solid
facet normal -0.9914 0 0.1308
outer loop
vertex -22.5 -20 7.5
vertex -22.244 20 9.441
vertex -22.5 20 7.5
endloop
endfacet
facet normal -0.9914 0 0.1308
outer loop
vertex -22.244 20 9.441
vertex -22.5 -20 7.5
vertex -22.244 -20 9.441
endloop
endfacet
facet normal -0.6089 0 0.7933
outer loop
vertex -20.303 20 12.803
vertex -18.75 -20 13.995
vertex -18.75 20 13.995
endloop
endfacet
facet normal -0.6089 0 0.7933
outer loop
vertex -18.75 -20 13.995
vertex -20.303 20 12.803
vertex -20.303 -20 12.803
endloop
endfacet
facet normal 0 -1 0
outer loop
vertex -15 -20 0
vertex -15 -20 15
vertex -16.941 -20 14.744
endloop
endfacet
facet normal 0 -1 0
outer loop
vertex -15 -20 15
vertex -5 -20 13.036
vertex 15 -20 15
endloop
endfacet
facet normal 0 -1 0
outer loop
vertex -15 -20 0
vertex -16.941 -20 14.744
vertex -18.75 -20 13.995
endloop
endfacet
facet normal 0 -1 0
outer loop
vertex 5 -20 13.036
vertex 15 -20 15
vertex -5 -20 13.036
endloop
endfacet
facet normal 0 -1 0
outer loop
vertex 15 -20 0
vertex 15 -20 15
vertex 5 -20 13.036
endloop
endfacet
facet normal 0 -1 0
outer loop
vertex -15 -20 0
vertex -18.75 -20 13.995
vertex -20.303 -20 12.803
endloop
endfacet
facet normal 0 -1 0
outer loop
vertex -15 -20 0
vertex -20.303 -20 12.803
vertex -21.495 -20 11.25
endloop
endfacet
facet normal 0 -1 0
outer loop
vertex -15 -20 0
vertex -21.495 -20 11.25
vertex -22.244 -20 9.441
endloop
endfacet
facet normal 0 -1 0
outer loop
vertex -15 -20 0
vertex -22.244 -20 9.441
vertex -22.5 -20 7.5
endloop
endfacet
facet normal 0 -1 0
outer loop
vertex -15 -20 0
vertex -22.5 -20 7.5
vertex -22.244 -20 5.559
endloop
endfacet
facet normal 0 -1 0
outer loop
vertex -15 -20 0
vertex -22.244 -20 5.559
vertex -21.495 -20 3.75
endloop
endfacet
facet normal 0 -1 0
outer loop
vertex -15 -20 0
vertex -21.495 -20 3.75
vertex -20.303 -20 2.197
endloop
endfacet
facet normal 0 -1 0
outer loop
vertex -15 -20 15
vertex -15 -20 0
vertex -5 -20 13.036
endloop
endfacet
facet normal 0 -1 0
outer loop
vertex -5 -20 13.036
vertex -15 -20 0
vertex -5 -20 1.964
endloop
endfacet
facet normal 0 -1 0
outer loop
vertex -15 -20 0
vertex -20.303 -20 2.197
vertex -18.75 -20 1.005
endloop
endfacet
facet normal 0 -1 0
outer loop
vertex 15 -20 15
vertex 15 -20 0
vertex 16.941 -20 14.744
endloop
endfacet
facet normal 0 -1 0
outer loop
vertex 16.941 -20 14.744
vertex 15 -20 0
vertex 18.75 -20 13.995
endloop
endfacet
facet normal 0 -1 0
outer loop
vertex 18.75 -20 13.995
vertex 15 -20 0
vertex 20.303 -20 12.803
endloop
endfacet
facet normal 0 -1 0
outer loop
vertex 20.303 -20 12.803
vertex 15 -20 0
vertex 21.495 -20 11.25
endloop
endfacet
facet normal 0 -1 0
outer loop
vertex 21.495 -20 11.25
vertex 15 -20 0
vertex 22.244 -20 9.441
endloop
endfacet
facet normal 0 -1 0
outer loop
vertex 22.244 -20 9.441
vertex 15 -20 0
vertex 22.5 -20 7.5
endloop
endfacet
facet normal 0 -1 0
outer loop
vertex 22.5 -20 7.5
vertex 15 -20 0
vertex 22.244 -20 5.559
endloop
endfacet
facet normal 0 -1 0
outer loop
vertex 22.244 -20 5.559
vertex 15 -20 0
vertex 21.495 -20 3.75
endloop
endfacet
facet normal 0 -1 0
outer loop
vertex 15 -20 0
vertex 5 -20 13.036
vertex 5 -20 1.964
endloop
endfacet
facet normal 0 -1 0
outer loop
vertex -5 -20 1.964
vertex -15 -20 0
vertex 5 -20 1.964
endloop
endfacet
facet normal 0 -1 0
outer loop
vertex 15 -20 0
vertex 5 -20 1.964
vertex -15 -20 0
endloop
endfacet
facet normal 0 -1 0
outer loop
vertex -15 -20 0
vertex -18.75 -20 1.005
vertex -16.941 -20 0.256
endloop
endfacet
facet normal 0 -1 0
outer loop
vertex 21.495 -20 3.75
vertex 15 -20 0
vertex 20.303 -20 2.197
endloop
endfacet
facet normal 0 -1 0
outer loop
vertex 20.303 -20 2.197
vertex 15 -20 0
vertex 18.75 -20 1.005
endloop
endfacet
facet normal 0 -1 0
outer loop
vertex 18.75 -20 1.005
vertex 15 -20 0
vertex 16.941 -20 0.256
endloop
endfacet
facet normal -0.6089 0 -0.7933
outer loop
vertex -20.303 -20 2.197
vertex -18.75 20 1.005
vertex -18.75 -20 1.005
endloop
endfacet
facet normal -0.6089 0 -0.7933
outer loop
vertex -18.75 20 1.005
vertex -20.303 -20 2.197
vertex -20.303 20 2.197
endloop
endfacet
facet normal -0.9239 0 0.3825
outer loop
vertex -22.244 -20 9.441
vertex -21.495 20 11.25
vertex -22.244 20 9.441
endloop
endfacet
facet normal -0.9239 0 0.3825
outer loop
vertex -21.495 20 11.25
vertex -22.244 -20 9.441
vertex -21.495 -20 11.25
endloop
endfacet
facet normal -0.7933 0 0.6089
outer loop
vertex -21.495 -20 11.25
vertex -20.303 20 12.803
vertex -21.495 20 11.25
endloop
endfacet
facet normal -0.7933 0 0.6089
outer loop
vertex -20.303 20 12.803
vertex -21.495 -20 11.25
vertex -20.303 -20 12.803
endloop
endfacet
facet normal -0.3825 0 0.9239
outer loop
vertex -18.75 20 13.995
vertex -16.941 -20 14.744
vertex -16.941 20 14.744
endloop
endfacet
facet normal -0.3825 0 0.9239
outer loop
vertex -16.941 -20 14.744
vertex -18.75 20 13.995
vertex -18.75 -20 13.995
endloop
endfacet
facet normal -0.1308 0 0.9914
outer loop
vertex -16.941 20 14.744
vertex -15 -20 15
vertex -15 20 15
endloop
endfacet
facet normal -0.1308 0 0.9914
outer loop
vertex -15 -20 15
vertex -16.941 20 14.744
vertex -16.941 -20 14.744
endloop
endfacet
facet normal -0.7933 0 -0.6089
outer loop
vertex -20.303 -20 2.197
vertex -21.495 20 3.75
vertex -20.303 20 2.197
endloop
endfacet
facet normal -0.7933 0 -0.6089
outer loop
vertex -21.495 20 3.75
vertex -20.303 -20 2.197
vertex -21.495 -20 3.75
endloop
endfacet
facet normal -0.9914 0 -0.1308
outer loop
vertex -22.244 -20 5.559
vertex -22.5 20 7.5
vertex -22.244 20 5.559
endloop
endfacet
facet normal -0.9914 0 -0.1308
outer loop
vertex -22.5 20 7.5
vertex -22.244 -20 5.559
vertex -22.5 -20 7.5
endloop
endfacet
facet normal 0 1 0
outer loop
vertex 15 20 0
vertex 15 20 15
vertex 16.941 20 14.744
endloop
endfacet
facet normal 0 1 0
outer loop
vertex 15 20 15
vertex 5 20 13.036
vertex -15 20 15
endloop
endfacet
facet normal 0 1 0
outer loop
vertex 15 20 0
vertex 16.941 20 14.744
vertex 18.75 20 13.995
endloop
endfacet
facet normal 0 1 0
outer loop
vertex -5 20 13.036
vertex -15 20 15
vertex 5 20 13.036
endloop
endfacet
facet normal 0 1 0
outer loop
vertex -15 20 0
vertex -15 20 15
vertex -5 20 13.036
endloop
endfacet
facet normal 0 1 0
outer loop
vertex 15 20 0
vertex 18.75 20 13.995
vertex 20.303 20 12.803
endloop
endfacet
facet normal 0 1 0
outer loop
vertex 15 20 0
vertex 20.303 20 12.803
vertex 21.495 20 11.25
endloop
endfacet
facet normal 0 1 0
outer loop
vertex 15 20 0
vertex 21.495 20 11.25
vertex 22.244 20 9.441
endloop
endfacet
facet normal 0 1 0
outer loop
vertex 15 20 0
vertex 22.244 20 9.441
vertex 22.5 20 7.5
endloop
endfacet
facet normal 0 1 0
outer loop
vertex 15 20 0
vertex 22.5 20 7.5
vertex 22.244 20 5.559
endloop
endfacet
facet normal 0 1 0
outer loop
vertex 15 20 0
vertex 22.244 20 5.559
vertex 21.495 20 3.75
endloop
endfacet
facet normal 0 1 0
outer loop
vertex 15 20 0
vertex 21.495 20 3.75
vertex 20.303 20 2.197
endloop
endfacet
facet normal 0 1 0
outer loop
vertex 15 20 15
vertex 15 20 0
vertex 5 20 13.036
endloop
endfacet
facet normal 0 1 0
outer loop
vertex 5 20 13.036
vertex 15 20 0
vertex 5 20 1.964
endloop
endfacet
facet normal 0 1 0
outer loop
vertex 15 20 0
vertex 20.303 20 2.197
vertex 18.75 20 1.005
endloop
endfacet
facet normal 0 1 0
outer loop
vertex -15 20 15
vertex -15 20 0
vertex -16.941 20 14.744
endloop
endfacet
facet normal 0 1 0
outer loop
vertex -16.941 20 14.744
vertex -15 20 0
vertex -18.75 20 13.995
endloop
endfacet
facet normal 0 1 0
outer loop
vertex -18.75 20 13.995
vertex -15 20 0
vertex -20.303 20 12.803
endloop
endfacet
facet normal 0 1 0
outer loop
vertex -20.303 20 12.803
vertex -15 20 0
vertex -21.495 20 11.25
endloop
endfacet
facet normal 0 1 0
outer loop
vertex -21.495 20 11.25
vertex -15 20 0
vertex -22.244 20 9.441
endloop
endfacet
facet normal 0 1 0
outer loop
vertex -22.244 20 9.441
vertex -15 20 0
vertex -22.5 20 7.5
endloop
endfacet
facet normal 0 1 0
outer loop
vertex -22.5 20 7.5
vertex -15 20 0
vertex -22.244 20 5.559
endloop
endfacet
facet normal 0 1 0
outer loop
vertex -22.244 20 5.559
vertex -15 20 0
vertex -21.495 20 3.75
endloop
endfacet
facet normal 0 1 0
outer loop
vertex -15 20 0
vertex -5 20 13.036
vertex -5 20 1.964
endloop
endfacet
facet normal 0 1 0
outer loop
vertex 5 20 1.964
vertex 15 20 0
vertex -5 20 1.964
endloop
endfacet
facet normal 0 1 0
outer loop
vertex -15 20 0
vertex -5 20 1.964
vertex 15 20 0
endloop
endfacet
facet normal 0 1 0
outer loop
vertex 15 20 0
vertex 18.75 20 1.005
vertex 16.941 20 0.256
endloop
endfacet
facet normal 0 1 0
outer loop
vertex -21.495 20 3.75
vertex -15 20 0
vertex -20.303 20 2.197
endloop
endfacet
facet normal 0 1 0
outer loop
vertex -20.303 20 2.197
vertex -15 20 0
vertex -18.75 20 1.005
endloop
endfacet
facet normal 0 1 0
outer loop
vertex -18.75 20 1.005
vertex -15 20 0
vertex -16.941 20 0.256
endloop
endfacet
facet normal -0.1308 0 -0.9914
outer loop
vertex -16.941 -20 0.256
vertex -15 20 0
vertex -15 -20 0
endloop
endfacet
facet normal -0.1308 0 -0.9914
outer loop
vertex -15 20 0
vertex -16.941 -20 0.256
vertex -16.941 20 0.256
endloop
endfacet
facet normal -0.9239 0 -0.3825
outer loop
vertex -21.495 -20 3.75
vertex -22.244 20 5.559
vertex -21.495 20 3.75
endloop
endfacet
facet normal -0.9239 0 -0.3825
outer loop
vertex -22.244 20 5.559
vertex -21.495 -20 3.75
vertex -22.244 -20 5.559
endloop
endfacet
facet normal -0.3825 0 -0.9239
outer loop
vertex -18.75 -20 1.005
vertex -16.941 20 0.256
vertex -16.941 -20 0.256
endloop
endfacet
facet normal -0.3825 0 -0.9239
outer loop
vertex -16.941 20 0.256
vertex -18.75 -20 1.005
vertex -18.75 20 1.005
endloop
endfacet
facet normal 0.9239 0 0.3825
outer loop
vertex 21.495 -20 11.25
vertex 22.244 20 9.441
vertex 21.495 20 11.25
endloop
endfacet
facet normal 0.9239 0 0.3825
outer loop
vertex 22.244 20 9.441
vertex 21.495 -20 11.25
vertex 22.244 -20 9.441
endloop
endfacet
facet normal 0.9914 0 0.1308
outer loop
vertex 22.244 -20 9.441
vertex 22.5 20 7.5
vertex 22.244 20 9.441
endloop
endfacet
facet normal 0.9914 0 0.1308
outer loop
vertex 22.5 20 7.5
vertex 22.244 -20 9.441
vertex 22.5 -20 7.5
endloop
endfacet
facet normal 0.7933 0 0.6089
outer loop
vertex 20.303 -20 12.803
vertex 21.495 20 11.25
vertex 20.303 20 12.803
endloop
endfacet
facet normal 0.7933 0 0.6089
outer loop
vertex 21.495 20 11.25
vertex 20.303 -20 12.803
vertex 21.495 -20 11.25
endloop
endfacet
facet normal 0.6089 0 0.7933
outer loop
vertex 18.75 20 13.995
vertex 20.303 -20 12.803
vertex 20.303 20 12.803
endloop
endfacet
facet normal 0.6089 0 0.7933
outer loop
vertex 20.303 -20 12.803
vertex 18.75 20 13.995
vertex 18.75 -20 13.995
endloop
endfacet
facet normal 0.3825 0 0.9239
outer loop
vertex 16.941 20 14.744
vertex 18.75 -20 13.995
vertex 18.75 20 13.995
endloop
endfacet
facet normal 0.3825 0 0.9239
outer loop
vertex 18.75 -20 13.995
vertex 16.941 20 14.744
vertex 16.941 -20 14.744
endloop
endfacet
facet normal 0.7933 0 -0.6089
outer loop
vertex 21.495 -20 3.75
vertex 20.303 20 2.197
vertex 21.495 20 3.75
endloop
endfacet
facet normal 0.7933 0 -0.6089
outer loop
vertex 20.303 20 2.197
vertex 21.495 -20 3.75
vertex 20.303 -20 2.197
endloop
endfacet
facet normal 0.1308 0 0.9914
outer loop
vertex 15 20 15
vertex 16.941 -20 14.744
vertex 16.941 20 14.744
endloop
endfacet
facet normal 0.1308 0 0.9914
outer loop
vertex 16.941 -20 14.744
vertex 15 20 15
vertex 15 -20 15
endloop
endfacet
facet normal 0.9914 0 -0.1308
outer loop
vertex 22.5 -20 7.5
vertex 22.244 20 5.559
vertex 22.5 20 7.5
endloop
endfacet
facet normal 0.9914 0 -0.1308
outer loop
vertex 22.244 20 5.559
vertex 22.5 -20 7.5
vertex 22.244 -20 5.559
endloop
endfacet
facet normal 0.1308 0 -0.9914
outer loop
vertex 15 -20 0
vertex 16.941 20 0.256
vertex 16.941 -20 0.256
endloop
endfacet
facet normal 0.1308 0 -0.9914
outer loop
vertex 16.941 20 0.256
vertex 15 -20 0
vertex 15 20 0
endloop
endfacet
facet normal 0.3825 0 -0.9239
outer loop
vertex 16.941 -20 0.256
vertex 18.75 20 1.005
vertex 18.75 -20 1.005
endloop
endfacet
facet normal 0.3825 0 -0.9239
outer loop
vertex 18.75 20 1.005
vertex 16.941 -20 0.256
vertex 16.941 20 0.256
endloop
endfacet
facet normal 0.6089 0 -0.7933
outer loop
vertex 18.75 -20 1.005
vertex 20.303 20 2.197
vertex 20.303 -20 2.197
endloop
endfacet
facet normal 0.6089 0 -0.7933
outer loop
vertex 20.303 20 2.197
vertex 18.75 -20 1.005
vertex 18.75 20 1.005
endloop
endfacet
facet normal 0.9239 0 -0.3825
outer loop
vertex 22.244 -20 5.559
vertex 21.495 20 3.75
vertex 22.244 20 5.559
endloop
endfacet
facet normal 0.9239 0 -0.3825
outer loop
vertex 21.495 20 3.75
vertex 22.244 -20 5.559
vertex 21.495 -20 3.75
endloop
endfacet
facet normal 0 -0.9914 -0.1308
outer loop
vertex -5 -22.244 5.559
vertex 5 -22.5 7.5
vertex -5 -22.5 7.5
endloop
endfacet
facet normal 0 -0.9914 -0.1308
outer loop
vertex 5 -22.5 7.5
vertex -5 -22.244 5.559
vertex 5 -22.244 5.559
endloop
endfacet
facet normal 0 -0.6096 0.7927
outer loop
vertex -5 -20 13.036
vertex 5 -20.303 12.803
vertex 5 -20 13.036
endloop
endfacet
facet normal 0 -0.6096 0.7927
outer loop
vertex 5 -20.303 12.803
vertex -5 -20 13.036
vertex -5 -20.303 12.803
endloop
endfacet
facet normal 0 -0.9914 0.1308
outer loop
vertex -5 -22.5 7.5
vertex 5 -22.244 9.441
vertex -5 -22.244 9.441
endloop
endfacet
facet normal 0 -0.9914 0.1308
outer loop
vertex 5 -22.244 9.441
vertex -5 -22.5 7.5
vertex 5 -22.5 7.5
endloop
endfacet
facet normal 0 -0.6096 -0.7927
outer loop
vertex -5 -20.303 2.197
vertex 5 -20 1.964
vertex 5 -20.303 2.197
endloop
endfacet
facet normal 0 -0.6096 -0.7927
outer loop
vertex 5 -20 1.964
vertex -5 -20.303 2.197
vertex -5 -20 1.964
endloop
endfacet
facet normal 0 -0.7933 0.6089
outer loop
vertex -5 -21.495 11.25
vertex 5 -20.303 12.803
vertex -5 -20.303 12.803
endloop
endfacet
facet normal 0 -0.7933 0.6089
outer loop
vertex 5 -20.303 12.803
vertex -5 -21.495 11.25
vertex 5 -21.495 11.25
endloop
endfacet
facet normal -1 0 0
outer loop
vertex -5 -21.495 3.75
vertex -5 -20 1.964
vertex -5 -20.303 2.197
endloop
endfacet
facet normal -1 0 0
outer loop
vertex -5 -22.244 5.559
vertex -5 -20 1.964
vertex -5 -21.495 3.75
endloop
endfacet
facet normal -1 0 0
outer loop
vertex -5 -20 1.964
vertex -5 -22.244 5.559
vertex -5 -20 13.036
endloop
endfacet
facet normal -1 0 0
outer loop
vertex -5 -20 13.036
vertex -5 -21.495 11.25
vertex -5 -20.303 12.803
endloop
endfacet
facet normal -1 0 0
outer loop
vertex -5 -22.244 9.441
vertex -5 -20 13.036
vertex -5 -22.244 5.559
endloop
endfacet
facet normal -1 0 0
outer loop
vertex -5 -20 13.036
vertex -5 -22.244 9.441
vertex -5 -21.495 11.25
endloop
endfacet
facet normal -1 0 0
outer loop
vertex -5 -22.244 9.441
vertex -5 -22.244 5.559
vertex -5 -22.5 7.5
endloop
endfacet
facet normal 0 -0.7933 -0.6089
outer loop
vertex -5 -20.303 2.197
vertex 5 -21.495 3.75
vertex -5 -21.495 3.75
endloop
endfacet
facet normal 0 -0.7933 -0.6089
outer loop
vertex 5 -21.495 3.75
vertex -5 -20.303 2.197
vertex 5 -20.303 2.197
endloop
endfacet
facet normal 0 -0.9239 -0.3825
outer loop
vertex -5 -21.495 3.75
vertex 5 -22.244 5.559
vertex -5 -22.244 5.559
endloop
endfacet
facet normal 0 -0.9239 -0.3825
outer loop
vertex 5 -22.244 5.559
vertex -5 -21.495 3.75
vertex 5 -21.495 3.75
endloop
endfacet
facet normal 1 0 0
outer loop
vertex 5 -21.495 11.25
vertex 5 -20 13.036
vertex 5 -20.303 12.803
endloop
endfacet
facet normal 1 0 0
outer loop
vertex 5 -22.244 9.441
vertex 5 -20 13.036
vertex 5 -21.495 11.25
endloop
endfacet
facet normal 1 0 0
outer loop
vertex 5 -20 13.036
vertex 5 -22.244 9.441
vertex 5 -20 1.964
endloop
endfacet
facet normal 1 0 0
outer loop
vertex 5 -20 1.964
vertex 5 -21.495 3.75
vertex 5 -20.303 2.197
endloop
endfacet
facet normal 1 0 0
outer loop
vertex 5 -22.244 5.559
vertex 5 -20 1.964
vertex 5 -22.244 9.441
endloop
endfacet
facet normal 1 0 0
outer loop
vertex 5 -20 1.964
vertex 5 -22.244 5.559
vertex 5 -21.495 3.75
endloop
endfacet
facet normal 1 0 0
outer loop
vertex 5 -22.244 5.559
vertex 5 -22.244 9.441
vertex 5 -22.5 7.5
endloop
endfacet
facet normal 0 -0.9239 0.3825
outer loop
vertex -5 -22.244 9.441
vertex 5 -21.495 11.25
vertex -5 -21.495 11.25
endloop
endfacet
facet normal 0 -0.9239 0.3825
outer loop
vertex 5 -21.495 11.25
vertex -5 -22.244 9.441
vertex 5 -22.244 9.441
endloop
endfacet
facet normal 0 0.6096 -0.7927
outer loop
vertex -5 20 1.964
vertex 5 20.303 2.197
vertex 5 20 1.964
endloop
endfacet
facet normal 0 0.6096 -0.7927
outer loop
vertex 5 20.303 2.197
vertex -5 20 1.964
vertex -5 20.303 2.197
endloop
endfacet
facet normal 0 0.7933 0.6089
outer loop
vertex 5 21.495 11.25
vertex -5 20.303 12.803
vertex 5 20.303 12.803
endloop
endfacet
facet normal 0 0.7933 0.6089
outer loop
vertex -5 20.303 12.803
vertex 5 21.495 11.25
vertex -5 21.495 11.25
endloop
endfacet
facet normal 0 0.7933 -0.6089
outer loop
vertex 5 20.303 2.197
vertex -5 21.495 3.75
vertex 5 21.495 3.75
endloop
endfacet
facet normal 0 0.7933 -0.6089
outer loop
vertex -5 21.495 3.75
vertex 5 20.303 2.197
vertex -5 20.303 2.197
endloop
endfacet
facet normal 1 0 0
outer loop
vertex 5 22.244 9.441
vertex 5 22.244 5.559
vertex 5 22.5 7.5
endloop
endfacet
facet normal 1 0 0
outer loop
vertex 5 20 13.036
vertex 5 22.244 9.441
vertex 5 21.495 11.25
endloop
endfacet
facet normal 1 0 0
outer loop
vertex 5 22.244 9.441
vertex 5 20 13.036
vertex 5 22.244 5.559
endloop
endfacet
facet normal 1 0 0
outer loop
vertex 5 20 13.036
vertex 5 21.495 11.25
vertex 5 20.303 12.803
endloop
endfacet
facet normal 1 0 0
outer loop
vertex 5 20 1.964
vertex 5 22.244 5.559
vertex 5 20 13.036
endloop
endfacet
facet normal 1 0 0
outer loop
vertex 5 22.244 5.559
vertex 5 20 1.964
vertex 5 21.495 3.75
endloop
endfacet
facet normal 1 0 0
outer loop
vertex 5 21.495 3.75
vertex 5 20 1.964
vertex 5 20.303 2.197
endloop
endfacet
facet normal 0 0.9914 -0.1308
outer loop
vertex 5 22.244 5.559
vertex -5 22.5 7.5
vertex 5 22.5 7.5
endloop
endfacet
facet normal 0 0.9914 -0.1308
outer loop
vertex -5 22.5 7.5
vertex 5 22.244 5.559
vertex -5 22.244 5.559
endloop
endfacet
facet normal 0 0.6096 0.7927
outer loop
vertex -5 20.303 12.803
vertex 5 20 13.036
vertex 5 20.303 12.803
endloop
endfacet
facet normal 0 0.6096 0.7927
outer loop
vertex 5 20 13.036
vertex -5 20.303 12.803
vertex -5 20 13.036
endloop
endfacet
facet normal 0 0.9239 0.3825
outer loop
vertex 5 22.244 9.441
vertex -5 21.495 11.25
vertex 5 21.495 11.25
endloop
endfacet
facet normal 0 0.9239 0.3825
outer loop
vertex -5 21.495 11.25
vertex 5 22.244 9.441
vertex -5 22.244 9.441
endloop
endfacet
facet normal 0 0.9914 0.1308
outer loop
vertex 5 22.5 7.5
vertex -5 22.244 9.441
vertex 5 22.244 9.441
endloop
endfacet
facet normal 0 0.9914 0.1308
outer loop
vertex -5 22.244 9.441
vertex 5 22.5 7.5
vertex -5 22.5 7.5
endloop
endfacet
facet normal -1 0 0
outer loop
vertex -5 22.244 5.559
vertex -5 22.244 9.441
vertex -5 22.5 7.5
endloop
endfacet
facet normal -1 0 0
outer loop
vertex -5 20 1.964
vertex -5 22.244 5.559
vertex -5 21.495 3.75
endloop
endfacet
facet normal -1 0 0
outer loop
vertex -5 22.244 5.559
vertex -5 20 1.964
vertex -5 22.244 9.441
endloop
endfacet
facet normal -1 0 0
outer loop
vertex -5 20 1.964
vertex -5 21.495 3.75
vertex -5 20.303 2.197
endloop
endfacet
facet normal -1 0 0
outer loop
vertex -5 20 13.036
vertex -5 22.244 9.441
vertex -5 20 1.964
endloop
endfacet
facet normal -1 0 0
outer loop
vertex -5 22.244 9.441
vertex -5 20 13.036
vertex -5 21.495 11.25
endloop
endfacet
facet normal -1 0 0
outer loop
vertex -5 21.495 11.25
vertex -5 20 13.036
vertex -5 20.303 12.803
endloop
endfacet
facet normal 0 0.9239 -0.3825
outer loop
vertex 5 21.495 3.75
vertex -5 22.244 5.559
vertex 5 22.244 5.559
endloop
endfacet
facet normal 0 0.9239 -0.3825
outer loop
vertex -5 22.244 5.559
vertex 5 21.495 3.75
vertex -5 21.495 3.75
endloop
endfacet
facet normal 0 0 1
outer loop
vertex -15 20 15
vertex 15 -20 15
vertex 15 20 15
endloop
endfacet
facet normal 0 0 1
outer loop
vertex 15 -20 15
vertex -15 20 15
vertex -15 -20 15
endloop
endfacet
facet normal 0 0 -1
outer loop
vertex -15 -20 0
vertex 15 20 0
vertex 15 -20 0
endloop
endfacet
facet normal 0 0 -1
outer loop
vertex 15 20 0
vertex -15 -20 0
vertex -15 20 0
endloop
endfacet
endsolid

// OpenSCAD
length = 40;
width = 30;
height = 15;

translate([-0.5*width, -0.5*length, 0]) cube([width,length,height]);
rotate ([90,0,0]) {
	translate([-0.5*width,0.5*height,-0.5*length]) cylinder(r=0.5*height, h=length);
	translate([0.5*width,0.5*height,-0.5*length]) cylinder(r=0.5*height, h=length);
}
rotate ([0,90,0]) {
	translate([-0.5*height,-0.5*width,-0.5*(length-2*height)]) cylinder(r=0.5*height, h=length-2*height);
	translate([-0.5*height,0.5*width,-0.5*(length-2*height)]) cylinder(r=0.5*height, h=length-2*height);
}
